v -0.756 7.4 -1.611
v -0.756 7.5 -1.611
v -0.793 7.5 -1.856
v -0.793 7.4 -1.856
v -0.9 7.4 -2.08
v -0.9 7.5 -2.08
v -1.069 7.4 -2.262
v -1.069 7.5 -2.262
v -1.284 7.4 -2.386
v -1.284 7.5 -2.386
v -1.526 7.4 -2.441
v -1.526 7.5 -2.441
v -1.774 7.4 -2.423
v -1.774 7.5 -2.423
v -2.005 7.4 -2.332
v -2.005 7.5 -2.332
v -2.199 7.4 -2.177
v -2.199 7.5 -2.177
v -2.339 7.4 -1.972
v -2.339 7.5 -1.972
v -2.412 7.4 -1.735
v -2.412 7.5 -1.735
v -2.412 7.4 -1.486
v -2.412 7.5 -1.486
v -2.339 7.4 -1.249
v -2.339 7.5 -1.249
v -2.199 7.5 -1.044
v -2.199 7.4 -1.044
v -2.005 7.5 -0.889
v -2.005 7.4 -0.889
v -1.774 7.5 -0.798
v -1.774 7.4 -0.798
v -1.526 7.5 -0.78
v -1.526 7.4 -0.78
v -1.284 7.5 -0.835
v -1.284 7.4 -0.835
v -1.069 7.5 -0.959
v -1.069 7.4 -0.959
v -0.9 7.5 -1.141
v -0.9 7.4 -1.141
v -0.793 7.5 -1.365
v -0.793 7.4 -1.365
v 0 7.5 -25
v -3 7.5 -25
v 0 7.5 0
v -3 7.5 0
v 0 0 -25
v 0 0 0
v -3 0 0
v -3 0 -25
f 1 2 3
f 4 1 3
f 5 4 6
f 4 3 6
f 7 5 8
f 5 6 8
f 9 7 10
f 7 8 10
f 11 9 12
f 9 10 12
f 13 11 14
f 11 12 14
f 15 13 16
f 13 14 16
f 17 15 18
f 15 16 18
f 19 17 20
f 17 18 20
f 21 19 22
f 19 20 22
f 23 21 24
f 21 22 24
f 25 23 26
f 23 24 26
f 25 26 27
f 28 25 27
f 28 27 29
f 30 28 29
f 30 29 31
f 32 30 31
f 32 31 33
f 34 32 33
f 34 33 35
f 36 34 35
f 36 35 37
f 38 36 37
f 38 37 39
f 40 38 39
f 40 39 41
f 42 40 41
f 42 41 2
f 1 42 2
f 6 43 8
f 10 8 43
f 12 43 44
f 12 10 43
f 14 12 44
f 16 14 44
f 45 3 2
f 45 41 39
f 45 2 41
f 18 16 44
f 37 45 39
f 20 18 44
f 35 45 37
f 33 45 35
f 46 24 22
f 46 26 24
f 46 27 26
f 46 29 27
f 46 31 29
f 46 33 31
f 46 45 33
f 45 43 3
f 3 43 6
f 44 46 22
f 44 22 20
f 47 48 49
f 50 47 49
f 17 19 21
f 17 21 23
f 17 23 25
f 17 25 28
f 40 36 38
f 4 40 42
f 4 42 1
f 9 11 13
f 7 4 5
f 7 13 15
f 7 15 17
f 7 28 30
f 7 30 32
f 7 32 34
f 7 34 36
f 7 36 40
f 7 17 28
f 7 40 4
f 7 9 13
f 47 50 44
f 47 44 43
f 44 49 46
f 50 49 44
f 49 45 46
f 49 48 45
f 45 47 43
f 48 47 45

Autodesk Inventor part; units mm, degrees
ref_plane "YZ Plane" through (0, 0, 0) normal (1, 0, 0) x (0, 1, 0)
ref_plane "XZ Plane" through (0, 0, 0) normal (0, 1, 0) x (-1, 0, 0)
ref_plane "XY Plane" through (0, 0, 0) normal (0, 0, 1) x (1, 0, 0)
sketch "Sketch1" plane through (0, 0, 0) normal (0, 1, 0) x (-1, 0, 0)
  line L0 (0, 0) -> (3, 0)
  line L1 (3, 0) -> (3, -25)
  line L2 (3, -25) -> (0, -25)
  line L3 (0, -25) -> (0, 0)
  dimension "d0" = 3
  dimension "d1" = 25
extrude "Extrusion1" add sketch "Sketch1" along normal blind 7.5
sketch "Sketch2" plane through (0, 7.5, 0) normal (0, 1, 0) x (1, 0, 0)
  circle A0 centre (-1.5887, 1.6106) radius 0.833
  point P0 (0, 0)
extrude "Extrusion2" cut sketch "Sketch2" against normal blind 0.1
properties part number "backfrontmotorwall"
